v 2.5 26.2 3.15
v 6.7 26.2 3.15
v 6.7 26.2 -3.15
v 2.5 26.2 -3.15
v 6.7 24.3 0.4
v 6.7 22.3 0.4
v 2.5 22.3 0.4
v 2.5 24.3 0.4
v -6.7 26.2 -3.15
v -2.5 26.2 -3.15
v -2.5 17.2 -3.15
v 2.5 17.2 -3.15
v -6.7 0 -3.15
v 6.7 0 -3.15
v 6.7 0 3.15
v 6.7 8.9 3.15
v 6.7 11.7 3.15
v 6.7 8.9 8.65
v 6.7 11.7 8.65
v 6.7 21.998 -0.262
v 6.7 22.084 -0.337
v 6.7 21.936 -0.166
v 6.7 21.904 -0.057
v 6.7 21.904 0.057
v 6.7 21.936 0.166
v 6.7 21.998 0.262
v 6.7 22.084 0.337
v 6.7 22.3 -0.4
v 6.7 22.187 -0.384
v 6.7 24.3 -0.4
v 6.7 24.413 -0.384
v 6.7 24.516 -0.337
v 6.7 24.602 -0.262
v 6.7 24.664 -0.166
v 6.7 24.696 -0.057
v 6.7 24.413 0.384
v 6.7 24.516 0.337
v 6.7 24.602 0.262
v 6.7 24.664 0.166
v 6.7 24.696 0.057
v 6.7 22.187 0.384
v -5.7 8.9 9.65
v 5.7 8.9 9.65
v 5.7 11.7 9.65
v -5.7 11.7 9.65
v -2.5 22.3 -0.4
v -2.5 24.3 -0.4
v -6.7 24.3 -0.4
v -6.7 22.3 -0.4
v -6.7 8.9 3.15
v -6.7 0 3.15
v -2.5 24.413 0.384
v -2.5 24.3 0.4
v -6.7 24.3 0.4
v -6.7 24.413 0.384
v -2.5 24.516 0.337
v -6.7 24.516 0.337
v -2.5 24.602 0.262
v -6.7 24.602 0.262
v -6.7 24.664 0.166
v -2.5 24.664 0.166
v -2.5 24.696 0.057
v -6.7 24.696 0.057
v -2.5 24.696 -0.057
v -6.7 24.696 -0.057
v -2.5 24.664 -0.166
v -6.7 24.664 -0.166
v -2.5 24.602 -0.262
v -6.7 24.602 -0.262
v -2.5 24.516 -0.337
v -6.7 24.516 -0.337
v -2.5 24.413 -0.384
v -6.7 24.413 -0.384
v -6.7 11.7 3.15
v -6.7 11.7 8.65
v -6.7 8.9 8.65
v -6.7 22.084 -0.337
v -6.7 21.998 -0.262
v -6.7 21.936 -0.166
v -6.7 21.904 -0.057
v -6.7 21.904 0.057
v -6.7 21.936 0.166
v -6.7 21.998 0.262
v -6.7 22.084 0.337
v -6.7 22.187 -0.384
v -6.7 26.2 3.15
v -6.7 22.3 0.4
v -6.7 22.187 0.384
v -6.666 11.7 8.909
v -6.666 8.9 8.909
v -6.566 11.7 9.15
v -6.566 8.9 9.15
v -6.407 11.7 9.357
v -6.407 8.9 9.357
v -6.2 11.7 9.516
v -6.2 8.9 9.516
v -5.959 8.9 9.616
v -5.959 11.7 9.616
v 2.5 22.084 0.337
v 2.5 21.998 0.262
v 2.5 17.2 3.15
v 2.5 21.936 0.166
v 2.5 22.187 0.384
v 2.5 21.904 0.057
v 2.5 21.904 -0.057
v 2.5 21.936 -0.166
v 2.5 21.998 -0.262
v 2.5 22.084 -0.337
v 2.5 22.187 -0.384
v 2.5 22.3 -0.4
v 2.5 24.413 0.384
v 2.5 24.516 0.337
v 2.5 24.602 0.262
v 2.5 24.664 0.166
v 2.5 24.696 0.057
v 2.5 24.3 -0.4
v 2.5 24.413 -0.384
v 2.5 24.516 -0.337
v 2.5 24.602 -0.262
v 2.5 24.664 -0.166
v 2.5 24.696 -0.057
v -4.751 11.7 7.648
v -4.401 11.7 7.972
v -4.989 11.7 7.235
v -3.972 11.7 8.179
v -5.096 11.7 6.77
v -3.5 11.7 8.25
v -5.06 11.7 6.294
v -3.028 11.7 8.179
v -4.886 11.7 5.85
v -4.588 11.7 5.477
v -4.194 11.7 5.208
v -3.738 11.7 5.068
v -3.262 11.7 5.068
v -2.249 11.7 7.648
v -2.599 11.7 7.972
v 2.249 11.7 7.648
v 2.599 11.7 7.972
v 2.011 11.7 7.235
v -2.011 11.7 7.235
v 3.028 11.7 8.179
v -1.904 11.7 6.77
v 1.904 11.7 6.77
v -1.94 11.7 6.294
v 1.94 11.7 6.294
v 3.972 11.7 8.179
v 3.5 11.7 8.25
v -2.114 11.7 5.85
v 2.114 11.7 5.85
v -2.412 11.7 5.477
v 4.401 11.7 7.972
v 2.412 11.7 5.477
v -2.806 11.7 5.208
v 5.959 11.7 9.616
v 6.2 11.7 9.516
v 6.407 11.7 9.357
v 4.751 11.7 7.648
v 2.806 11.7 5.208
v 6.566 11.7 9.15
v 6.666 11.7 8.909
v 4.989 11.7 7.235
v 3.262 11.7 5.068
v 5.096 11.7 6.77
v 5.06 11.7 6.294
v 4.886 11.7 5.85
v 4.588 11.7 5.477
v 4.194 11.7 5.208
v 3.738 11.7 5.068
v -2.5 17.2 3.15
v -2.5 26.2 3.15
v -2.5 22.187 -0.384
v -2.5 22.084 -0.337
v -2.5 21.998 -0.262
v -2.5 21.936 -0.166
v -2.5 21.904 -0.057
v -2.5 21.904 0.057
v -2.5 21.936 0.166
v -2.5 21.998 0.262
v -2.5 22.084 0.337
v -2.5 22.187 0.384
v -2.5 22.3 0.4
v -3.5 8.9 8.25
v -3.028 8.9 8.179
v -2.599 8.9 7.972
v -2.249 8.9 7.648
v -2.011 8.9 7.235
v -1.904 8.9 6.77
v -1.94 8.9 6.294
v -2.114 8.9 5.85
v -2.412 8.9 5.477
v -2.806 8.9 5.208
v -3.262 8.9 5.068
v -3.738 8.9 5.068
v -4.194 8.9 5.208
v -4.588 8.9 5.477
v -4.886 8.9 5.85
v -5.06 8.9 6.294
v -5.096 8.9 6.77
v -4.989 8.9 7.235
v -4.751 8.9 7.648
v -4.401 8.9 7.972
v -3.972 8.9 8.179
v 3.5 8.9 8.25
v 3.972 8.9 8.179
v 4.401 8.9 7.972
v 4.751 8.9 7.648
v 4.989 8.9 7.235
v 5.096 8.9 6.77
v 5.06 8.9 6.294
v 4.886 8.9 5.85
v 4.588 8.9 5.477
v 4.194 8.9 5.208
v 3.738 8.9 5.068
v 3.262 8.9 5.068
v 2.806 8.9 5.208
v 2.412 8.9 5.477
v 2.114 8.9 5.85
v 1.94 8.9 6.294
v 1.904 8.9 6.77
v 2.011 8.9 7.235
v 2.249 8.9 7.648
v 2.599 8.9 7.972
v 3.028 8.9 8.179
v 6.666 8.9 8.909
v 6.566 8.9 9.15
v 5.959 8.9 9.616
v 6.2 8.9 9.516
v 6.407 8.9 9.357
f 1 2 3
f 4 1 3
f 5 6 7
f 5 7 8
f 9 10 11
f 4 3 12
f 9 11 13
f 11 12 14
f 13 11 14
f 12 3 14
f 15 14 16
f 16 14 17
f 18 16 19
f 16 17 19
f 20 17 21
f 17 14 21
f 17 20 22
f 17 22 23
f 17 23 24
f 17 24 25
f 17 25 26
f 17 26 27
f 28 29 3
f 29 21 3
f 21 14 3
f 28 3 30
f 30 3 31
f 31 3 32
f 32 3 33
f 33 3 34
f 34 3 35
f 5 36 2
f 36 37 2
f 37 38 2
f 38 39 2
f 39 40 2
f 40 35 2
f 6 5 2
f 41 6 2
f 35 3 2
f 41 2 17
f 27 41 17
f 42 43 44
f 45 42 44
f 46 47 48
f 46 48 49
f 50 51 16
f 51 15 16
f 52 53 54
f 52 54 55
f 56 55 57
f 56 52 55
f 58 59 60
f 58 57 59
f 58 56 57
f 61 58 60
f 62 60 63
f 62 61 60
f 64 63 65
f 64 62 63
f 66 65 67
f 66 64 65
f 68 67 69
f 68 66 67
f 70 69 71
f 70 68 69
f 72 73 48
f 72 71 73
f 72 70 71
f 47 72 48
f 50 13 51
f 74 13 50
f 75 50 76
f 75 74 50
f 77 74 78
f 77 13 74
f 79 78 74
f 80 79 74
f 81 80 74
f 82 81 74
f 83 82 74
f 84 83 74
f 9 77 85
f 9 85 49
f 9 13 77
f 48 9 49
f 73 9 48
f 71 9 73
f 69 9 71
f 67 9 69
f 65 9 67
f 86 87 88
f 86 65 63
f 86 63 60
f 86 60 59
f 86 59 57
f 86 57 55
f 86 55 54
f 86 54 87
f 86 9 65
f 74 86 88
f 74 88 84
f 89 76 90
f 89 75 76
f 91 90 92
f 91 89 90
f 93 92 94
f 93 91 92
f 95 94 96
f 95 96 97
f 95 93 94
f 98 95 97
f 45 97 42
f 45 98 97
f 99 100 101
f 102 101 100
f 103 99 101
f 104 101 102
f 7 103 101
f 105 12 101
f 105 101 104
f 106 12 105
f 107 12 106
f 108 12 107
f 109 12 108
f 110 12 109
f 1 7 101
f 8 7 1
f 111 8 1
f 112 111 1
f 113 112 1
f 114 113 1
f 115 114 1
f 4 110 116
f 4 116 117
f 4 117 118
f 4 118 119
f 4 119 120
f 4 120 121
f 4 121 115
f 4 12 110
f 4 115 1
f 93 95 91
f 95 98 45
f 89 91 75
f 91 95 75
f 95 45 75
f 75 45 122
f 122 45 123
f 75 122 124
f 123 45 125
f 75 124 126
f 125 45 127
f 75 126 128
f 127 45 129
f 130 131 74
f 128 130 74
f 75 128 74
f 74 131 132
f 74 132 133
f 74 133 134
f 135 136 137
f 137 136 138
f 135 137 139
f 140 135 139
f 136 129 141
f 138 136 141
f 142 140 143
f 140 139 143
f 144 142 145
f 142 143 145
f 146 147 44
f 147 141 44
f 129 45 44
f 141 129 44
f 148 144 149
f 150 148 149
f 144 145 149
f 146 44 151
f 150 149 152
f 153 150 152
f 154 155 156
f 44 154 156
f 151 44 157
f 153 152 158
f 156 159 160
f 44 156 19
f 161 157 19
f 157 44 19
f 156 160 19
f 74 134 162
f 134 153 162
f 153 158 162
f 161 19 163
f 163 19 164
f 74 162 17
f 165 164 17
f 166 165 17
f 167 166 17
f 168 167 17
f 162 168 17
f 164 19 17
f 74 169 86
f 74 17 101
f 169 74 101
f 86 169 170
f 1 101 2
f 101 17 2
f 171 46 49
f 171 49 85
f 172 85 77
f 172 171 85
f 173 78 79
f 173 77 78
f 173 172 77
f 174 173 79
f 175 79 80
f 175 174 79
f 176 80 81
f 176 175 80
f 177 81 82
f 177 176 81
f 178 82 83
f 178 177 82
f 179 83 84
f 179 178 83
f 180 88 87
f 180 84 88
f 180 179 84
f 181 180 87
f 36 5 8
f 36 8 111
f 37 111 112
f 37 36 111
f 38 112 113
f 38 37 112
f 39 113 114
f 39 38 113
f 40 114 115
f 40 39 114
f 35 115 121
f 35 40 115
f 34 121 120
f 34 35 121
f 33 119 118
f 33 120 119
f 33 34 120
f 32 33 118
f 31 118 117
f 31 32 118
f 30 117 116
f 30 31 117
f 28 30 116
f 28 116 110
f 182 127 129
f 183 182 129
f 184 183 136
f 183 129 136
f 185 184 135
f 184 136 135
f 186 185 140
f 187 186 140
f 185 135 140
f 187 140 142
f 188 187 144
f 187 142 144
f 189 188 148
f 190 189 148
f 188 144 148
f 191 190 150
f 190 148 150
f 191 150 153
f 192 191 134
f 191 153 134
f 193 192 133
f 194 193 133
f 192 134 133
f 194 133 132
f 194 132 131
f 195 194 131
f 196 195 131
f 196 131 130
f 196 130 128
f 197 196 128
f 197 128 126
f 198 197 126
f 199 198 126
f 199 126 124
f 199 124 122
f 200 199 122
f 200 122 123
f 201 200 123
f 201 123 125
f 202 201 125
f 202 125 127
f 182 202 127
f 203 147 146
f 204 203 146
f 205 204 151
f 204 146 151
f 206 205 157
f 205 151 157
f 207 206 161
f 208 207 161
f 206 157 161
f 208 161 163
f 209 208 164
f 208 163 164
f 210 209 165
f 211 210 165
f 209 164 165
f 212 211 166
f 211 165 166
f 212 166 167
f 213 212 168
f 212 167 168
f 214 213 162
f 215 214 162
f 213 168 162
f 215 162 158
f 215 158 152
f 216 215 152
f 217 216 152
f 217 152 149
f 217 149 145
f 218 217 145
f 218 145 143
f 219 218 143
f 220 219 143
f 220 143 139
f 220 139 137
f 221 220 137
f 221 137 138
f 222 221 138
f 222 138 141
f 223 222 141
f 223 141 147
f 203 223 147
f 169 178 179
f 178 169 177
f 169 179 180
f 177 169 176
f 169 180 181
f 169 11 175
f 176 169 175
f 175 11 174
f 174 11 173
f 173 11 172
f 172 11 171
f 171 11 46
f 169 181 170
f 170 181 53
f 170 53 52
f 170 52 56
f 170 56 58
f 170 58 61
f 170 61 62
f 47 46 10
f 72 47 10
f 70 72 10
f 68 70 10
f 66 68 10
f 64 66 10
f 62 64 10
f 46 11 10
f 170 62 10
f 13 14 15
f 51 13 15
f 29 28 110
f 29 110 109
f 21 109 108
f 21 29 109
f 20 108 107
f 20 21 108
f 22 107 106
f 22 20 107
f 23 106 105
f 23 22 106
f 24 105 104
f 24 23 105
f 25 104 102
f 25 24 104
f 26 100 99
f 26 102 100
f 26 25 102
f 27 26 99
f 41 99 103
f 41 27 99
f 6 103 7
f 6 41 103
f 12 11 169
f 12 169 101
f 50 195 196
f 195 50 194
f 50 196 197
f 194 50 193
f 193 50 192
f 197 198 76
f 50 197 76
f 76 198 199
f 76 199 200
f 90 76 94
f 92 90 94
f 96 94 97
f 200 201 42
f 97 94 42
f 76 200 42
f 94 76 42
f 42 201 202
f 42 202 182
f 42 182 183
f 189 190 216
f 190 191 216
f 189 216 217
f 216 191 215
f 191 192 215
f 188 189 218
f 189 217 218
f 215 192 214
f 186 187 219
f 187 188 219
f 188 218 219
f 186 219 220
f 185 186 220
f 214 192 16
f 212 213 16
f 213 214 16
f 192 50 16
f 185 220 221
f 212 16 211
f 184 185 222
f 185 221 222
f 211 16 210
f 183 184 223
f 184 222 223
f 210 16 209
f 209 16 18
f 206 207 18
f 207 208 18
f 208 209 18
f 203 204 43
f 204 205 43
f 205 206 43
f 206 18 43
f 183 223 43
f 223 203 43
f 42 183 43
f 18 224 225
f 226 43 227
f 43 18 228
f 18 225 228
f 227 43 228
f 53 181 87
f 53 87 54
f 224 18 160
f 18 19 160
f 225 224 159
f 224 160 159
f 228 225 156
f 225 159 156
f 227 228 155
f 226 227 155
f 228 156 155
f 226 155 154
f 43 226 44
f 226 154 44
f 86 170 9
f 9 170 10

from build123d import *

# Parameters (mm, degrees)
EXTRUDE_1_DEPTH          = 6.7
CUT_EXTRUDE_1_DEPTH      = 29.713280899
CUT_EXTRUDE_1_DEPTH_BACK = 29.713280899
SKETCH_2_W               = 5
SKETCH_2_H               = 9
FILLET_1_R               = 1
SKETCH_3_R               = 1.6
CUT_EXTRUDE_2_DEPTH      = 13.4
CUT_EXTRUDE_3_DEPTH      = 31.969702937


with BuildPart() as part:
    # 草图1 → 凸台-拉伸1 (new, symmetric)
    with BuildSketch(Plane(origin=(0, 0, 0), x_dir=(0, 0, -1), z_dir=(1, 0, 0))):
        Polygon((3.15, 0), (-3.15, 0), (-3.15, 8.9), (-9.65, 8.9), (-9.65, 11.7), (-3.15, 11.7), (-3.15, 26.2), (3.15, 26.2), align=None)
    extrude(amount=EXTRUDE_1_DEPTH, both=True)

    # 草图2 → 切除-拉伸1 (cut, two sides: drawn at the far end of the back side and taken through both)
    with BuildSketch(Plane.XY.offset(-CUT_EXTRUDE_1_DEPTH_BACK)):
        with Locations((0, 21.7)):
            Rectangle(SKETCH_2_W, SKETCH_2_H)
    extrude(amount=CUT_EXTRUDE_1_DEPTH + CUT_EXTRUDE_1_DEPTH_BACK, mode=Mode.SUBTRACT)

    # 圆角1
    fillet_1_edges = [part.edges().sort_by_distance(p)[0] for p in [
        (6.7, 10.3, 9.65),
        (-6.7, 10.3, 9.65),
    ]]
    fillet(fillet_1_edges, radius=FILLET_1_R)

    # 草图3 → 切除-拉伸2 (cut)
    with BuildSketch(Plane(origin=(0, 11.7, 0), x_dir=(1, 0, 0), z_dir=(0, 1, 0))):
        with Locations(Location((3.5, -6.65, 0), (0, 0, 270))):
            Circle(SKETCH_3_R)
        with Locations(Location((-3.5, -6.65, 0), (0, 0, 270))):
            Circle(SKETCH_3_R)
    extrude(amount=-CUT_EXTRUDE_2_DEPTH, mode=Mode.SUBTRACT)

    # 草图4 → 切除-拉伸3 (cut, through all)
    with BuildSketch(Plane(origin=(6.7, 0, 0), x_dir=(0, 0, -1), z_dir=(1, 0, 0))):
        with BuildLine():
            Line((0.4, 24.3), (0.4, 22.3))
            ThreePointArc((0.4, 22.3), (0, 21.9), (-0.4, 22.3))
            Line((-0.4, 22.3), (-0.4, 24.3))
            ThreePointArc((-0.4, 24.3), (0, 24.7), (0.4, 24.3))
        make_face()
    extrude(amount=-CUT_EXTRUDE_3_DEPTH, mode=Mode.SUBTRACT)


solid = part.part
